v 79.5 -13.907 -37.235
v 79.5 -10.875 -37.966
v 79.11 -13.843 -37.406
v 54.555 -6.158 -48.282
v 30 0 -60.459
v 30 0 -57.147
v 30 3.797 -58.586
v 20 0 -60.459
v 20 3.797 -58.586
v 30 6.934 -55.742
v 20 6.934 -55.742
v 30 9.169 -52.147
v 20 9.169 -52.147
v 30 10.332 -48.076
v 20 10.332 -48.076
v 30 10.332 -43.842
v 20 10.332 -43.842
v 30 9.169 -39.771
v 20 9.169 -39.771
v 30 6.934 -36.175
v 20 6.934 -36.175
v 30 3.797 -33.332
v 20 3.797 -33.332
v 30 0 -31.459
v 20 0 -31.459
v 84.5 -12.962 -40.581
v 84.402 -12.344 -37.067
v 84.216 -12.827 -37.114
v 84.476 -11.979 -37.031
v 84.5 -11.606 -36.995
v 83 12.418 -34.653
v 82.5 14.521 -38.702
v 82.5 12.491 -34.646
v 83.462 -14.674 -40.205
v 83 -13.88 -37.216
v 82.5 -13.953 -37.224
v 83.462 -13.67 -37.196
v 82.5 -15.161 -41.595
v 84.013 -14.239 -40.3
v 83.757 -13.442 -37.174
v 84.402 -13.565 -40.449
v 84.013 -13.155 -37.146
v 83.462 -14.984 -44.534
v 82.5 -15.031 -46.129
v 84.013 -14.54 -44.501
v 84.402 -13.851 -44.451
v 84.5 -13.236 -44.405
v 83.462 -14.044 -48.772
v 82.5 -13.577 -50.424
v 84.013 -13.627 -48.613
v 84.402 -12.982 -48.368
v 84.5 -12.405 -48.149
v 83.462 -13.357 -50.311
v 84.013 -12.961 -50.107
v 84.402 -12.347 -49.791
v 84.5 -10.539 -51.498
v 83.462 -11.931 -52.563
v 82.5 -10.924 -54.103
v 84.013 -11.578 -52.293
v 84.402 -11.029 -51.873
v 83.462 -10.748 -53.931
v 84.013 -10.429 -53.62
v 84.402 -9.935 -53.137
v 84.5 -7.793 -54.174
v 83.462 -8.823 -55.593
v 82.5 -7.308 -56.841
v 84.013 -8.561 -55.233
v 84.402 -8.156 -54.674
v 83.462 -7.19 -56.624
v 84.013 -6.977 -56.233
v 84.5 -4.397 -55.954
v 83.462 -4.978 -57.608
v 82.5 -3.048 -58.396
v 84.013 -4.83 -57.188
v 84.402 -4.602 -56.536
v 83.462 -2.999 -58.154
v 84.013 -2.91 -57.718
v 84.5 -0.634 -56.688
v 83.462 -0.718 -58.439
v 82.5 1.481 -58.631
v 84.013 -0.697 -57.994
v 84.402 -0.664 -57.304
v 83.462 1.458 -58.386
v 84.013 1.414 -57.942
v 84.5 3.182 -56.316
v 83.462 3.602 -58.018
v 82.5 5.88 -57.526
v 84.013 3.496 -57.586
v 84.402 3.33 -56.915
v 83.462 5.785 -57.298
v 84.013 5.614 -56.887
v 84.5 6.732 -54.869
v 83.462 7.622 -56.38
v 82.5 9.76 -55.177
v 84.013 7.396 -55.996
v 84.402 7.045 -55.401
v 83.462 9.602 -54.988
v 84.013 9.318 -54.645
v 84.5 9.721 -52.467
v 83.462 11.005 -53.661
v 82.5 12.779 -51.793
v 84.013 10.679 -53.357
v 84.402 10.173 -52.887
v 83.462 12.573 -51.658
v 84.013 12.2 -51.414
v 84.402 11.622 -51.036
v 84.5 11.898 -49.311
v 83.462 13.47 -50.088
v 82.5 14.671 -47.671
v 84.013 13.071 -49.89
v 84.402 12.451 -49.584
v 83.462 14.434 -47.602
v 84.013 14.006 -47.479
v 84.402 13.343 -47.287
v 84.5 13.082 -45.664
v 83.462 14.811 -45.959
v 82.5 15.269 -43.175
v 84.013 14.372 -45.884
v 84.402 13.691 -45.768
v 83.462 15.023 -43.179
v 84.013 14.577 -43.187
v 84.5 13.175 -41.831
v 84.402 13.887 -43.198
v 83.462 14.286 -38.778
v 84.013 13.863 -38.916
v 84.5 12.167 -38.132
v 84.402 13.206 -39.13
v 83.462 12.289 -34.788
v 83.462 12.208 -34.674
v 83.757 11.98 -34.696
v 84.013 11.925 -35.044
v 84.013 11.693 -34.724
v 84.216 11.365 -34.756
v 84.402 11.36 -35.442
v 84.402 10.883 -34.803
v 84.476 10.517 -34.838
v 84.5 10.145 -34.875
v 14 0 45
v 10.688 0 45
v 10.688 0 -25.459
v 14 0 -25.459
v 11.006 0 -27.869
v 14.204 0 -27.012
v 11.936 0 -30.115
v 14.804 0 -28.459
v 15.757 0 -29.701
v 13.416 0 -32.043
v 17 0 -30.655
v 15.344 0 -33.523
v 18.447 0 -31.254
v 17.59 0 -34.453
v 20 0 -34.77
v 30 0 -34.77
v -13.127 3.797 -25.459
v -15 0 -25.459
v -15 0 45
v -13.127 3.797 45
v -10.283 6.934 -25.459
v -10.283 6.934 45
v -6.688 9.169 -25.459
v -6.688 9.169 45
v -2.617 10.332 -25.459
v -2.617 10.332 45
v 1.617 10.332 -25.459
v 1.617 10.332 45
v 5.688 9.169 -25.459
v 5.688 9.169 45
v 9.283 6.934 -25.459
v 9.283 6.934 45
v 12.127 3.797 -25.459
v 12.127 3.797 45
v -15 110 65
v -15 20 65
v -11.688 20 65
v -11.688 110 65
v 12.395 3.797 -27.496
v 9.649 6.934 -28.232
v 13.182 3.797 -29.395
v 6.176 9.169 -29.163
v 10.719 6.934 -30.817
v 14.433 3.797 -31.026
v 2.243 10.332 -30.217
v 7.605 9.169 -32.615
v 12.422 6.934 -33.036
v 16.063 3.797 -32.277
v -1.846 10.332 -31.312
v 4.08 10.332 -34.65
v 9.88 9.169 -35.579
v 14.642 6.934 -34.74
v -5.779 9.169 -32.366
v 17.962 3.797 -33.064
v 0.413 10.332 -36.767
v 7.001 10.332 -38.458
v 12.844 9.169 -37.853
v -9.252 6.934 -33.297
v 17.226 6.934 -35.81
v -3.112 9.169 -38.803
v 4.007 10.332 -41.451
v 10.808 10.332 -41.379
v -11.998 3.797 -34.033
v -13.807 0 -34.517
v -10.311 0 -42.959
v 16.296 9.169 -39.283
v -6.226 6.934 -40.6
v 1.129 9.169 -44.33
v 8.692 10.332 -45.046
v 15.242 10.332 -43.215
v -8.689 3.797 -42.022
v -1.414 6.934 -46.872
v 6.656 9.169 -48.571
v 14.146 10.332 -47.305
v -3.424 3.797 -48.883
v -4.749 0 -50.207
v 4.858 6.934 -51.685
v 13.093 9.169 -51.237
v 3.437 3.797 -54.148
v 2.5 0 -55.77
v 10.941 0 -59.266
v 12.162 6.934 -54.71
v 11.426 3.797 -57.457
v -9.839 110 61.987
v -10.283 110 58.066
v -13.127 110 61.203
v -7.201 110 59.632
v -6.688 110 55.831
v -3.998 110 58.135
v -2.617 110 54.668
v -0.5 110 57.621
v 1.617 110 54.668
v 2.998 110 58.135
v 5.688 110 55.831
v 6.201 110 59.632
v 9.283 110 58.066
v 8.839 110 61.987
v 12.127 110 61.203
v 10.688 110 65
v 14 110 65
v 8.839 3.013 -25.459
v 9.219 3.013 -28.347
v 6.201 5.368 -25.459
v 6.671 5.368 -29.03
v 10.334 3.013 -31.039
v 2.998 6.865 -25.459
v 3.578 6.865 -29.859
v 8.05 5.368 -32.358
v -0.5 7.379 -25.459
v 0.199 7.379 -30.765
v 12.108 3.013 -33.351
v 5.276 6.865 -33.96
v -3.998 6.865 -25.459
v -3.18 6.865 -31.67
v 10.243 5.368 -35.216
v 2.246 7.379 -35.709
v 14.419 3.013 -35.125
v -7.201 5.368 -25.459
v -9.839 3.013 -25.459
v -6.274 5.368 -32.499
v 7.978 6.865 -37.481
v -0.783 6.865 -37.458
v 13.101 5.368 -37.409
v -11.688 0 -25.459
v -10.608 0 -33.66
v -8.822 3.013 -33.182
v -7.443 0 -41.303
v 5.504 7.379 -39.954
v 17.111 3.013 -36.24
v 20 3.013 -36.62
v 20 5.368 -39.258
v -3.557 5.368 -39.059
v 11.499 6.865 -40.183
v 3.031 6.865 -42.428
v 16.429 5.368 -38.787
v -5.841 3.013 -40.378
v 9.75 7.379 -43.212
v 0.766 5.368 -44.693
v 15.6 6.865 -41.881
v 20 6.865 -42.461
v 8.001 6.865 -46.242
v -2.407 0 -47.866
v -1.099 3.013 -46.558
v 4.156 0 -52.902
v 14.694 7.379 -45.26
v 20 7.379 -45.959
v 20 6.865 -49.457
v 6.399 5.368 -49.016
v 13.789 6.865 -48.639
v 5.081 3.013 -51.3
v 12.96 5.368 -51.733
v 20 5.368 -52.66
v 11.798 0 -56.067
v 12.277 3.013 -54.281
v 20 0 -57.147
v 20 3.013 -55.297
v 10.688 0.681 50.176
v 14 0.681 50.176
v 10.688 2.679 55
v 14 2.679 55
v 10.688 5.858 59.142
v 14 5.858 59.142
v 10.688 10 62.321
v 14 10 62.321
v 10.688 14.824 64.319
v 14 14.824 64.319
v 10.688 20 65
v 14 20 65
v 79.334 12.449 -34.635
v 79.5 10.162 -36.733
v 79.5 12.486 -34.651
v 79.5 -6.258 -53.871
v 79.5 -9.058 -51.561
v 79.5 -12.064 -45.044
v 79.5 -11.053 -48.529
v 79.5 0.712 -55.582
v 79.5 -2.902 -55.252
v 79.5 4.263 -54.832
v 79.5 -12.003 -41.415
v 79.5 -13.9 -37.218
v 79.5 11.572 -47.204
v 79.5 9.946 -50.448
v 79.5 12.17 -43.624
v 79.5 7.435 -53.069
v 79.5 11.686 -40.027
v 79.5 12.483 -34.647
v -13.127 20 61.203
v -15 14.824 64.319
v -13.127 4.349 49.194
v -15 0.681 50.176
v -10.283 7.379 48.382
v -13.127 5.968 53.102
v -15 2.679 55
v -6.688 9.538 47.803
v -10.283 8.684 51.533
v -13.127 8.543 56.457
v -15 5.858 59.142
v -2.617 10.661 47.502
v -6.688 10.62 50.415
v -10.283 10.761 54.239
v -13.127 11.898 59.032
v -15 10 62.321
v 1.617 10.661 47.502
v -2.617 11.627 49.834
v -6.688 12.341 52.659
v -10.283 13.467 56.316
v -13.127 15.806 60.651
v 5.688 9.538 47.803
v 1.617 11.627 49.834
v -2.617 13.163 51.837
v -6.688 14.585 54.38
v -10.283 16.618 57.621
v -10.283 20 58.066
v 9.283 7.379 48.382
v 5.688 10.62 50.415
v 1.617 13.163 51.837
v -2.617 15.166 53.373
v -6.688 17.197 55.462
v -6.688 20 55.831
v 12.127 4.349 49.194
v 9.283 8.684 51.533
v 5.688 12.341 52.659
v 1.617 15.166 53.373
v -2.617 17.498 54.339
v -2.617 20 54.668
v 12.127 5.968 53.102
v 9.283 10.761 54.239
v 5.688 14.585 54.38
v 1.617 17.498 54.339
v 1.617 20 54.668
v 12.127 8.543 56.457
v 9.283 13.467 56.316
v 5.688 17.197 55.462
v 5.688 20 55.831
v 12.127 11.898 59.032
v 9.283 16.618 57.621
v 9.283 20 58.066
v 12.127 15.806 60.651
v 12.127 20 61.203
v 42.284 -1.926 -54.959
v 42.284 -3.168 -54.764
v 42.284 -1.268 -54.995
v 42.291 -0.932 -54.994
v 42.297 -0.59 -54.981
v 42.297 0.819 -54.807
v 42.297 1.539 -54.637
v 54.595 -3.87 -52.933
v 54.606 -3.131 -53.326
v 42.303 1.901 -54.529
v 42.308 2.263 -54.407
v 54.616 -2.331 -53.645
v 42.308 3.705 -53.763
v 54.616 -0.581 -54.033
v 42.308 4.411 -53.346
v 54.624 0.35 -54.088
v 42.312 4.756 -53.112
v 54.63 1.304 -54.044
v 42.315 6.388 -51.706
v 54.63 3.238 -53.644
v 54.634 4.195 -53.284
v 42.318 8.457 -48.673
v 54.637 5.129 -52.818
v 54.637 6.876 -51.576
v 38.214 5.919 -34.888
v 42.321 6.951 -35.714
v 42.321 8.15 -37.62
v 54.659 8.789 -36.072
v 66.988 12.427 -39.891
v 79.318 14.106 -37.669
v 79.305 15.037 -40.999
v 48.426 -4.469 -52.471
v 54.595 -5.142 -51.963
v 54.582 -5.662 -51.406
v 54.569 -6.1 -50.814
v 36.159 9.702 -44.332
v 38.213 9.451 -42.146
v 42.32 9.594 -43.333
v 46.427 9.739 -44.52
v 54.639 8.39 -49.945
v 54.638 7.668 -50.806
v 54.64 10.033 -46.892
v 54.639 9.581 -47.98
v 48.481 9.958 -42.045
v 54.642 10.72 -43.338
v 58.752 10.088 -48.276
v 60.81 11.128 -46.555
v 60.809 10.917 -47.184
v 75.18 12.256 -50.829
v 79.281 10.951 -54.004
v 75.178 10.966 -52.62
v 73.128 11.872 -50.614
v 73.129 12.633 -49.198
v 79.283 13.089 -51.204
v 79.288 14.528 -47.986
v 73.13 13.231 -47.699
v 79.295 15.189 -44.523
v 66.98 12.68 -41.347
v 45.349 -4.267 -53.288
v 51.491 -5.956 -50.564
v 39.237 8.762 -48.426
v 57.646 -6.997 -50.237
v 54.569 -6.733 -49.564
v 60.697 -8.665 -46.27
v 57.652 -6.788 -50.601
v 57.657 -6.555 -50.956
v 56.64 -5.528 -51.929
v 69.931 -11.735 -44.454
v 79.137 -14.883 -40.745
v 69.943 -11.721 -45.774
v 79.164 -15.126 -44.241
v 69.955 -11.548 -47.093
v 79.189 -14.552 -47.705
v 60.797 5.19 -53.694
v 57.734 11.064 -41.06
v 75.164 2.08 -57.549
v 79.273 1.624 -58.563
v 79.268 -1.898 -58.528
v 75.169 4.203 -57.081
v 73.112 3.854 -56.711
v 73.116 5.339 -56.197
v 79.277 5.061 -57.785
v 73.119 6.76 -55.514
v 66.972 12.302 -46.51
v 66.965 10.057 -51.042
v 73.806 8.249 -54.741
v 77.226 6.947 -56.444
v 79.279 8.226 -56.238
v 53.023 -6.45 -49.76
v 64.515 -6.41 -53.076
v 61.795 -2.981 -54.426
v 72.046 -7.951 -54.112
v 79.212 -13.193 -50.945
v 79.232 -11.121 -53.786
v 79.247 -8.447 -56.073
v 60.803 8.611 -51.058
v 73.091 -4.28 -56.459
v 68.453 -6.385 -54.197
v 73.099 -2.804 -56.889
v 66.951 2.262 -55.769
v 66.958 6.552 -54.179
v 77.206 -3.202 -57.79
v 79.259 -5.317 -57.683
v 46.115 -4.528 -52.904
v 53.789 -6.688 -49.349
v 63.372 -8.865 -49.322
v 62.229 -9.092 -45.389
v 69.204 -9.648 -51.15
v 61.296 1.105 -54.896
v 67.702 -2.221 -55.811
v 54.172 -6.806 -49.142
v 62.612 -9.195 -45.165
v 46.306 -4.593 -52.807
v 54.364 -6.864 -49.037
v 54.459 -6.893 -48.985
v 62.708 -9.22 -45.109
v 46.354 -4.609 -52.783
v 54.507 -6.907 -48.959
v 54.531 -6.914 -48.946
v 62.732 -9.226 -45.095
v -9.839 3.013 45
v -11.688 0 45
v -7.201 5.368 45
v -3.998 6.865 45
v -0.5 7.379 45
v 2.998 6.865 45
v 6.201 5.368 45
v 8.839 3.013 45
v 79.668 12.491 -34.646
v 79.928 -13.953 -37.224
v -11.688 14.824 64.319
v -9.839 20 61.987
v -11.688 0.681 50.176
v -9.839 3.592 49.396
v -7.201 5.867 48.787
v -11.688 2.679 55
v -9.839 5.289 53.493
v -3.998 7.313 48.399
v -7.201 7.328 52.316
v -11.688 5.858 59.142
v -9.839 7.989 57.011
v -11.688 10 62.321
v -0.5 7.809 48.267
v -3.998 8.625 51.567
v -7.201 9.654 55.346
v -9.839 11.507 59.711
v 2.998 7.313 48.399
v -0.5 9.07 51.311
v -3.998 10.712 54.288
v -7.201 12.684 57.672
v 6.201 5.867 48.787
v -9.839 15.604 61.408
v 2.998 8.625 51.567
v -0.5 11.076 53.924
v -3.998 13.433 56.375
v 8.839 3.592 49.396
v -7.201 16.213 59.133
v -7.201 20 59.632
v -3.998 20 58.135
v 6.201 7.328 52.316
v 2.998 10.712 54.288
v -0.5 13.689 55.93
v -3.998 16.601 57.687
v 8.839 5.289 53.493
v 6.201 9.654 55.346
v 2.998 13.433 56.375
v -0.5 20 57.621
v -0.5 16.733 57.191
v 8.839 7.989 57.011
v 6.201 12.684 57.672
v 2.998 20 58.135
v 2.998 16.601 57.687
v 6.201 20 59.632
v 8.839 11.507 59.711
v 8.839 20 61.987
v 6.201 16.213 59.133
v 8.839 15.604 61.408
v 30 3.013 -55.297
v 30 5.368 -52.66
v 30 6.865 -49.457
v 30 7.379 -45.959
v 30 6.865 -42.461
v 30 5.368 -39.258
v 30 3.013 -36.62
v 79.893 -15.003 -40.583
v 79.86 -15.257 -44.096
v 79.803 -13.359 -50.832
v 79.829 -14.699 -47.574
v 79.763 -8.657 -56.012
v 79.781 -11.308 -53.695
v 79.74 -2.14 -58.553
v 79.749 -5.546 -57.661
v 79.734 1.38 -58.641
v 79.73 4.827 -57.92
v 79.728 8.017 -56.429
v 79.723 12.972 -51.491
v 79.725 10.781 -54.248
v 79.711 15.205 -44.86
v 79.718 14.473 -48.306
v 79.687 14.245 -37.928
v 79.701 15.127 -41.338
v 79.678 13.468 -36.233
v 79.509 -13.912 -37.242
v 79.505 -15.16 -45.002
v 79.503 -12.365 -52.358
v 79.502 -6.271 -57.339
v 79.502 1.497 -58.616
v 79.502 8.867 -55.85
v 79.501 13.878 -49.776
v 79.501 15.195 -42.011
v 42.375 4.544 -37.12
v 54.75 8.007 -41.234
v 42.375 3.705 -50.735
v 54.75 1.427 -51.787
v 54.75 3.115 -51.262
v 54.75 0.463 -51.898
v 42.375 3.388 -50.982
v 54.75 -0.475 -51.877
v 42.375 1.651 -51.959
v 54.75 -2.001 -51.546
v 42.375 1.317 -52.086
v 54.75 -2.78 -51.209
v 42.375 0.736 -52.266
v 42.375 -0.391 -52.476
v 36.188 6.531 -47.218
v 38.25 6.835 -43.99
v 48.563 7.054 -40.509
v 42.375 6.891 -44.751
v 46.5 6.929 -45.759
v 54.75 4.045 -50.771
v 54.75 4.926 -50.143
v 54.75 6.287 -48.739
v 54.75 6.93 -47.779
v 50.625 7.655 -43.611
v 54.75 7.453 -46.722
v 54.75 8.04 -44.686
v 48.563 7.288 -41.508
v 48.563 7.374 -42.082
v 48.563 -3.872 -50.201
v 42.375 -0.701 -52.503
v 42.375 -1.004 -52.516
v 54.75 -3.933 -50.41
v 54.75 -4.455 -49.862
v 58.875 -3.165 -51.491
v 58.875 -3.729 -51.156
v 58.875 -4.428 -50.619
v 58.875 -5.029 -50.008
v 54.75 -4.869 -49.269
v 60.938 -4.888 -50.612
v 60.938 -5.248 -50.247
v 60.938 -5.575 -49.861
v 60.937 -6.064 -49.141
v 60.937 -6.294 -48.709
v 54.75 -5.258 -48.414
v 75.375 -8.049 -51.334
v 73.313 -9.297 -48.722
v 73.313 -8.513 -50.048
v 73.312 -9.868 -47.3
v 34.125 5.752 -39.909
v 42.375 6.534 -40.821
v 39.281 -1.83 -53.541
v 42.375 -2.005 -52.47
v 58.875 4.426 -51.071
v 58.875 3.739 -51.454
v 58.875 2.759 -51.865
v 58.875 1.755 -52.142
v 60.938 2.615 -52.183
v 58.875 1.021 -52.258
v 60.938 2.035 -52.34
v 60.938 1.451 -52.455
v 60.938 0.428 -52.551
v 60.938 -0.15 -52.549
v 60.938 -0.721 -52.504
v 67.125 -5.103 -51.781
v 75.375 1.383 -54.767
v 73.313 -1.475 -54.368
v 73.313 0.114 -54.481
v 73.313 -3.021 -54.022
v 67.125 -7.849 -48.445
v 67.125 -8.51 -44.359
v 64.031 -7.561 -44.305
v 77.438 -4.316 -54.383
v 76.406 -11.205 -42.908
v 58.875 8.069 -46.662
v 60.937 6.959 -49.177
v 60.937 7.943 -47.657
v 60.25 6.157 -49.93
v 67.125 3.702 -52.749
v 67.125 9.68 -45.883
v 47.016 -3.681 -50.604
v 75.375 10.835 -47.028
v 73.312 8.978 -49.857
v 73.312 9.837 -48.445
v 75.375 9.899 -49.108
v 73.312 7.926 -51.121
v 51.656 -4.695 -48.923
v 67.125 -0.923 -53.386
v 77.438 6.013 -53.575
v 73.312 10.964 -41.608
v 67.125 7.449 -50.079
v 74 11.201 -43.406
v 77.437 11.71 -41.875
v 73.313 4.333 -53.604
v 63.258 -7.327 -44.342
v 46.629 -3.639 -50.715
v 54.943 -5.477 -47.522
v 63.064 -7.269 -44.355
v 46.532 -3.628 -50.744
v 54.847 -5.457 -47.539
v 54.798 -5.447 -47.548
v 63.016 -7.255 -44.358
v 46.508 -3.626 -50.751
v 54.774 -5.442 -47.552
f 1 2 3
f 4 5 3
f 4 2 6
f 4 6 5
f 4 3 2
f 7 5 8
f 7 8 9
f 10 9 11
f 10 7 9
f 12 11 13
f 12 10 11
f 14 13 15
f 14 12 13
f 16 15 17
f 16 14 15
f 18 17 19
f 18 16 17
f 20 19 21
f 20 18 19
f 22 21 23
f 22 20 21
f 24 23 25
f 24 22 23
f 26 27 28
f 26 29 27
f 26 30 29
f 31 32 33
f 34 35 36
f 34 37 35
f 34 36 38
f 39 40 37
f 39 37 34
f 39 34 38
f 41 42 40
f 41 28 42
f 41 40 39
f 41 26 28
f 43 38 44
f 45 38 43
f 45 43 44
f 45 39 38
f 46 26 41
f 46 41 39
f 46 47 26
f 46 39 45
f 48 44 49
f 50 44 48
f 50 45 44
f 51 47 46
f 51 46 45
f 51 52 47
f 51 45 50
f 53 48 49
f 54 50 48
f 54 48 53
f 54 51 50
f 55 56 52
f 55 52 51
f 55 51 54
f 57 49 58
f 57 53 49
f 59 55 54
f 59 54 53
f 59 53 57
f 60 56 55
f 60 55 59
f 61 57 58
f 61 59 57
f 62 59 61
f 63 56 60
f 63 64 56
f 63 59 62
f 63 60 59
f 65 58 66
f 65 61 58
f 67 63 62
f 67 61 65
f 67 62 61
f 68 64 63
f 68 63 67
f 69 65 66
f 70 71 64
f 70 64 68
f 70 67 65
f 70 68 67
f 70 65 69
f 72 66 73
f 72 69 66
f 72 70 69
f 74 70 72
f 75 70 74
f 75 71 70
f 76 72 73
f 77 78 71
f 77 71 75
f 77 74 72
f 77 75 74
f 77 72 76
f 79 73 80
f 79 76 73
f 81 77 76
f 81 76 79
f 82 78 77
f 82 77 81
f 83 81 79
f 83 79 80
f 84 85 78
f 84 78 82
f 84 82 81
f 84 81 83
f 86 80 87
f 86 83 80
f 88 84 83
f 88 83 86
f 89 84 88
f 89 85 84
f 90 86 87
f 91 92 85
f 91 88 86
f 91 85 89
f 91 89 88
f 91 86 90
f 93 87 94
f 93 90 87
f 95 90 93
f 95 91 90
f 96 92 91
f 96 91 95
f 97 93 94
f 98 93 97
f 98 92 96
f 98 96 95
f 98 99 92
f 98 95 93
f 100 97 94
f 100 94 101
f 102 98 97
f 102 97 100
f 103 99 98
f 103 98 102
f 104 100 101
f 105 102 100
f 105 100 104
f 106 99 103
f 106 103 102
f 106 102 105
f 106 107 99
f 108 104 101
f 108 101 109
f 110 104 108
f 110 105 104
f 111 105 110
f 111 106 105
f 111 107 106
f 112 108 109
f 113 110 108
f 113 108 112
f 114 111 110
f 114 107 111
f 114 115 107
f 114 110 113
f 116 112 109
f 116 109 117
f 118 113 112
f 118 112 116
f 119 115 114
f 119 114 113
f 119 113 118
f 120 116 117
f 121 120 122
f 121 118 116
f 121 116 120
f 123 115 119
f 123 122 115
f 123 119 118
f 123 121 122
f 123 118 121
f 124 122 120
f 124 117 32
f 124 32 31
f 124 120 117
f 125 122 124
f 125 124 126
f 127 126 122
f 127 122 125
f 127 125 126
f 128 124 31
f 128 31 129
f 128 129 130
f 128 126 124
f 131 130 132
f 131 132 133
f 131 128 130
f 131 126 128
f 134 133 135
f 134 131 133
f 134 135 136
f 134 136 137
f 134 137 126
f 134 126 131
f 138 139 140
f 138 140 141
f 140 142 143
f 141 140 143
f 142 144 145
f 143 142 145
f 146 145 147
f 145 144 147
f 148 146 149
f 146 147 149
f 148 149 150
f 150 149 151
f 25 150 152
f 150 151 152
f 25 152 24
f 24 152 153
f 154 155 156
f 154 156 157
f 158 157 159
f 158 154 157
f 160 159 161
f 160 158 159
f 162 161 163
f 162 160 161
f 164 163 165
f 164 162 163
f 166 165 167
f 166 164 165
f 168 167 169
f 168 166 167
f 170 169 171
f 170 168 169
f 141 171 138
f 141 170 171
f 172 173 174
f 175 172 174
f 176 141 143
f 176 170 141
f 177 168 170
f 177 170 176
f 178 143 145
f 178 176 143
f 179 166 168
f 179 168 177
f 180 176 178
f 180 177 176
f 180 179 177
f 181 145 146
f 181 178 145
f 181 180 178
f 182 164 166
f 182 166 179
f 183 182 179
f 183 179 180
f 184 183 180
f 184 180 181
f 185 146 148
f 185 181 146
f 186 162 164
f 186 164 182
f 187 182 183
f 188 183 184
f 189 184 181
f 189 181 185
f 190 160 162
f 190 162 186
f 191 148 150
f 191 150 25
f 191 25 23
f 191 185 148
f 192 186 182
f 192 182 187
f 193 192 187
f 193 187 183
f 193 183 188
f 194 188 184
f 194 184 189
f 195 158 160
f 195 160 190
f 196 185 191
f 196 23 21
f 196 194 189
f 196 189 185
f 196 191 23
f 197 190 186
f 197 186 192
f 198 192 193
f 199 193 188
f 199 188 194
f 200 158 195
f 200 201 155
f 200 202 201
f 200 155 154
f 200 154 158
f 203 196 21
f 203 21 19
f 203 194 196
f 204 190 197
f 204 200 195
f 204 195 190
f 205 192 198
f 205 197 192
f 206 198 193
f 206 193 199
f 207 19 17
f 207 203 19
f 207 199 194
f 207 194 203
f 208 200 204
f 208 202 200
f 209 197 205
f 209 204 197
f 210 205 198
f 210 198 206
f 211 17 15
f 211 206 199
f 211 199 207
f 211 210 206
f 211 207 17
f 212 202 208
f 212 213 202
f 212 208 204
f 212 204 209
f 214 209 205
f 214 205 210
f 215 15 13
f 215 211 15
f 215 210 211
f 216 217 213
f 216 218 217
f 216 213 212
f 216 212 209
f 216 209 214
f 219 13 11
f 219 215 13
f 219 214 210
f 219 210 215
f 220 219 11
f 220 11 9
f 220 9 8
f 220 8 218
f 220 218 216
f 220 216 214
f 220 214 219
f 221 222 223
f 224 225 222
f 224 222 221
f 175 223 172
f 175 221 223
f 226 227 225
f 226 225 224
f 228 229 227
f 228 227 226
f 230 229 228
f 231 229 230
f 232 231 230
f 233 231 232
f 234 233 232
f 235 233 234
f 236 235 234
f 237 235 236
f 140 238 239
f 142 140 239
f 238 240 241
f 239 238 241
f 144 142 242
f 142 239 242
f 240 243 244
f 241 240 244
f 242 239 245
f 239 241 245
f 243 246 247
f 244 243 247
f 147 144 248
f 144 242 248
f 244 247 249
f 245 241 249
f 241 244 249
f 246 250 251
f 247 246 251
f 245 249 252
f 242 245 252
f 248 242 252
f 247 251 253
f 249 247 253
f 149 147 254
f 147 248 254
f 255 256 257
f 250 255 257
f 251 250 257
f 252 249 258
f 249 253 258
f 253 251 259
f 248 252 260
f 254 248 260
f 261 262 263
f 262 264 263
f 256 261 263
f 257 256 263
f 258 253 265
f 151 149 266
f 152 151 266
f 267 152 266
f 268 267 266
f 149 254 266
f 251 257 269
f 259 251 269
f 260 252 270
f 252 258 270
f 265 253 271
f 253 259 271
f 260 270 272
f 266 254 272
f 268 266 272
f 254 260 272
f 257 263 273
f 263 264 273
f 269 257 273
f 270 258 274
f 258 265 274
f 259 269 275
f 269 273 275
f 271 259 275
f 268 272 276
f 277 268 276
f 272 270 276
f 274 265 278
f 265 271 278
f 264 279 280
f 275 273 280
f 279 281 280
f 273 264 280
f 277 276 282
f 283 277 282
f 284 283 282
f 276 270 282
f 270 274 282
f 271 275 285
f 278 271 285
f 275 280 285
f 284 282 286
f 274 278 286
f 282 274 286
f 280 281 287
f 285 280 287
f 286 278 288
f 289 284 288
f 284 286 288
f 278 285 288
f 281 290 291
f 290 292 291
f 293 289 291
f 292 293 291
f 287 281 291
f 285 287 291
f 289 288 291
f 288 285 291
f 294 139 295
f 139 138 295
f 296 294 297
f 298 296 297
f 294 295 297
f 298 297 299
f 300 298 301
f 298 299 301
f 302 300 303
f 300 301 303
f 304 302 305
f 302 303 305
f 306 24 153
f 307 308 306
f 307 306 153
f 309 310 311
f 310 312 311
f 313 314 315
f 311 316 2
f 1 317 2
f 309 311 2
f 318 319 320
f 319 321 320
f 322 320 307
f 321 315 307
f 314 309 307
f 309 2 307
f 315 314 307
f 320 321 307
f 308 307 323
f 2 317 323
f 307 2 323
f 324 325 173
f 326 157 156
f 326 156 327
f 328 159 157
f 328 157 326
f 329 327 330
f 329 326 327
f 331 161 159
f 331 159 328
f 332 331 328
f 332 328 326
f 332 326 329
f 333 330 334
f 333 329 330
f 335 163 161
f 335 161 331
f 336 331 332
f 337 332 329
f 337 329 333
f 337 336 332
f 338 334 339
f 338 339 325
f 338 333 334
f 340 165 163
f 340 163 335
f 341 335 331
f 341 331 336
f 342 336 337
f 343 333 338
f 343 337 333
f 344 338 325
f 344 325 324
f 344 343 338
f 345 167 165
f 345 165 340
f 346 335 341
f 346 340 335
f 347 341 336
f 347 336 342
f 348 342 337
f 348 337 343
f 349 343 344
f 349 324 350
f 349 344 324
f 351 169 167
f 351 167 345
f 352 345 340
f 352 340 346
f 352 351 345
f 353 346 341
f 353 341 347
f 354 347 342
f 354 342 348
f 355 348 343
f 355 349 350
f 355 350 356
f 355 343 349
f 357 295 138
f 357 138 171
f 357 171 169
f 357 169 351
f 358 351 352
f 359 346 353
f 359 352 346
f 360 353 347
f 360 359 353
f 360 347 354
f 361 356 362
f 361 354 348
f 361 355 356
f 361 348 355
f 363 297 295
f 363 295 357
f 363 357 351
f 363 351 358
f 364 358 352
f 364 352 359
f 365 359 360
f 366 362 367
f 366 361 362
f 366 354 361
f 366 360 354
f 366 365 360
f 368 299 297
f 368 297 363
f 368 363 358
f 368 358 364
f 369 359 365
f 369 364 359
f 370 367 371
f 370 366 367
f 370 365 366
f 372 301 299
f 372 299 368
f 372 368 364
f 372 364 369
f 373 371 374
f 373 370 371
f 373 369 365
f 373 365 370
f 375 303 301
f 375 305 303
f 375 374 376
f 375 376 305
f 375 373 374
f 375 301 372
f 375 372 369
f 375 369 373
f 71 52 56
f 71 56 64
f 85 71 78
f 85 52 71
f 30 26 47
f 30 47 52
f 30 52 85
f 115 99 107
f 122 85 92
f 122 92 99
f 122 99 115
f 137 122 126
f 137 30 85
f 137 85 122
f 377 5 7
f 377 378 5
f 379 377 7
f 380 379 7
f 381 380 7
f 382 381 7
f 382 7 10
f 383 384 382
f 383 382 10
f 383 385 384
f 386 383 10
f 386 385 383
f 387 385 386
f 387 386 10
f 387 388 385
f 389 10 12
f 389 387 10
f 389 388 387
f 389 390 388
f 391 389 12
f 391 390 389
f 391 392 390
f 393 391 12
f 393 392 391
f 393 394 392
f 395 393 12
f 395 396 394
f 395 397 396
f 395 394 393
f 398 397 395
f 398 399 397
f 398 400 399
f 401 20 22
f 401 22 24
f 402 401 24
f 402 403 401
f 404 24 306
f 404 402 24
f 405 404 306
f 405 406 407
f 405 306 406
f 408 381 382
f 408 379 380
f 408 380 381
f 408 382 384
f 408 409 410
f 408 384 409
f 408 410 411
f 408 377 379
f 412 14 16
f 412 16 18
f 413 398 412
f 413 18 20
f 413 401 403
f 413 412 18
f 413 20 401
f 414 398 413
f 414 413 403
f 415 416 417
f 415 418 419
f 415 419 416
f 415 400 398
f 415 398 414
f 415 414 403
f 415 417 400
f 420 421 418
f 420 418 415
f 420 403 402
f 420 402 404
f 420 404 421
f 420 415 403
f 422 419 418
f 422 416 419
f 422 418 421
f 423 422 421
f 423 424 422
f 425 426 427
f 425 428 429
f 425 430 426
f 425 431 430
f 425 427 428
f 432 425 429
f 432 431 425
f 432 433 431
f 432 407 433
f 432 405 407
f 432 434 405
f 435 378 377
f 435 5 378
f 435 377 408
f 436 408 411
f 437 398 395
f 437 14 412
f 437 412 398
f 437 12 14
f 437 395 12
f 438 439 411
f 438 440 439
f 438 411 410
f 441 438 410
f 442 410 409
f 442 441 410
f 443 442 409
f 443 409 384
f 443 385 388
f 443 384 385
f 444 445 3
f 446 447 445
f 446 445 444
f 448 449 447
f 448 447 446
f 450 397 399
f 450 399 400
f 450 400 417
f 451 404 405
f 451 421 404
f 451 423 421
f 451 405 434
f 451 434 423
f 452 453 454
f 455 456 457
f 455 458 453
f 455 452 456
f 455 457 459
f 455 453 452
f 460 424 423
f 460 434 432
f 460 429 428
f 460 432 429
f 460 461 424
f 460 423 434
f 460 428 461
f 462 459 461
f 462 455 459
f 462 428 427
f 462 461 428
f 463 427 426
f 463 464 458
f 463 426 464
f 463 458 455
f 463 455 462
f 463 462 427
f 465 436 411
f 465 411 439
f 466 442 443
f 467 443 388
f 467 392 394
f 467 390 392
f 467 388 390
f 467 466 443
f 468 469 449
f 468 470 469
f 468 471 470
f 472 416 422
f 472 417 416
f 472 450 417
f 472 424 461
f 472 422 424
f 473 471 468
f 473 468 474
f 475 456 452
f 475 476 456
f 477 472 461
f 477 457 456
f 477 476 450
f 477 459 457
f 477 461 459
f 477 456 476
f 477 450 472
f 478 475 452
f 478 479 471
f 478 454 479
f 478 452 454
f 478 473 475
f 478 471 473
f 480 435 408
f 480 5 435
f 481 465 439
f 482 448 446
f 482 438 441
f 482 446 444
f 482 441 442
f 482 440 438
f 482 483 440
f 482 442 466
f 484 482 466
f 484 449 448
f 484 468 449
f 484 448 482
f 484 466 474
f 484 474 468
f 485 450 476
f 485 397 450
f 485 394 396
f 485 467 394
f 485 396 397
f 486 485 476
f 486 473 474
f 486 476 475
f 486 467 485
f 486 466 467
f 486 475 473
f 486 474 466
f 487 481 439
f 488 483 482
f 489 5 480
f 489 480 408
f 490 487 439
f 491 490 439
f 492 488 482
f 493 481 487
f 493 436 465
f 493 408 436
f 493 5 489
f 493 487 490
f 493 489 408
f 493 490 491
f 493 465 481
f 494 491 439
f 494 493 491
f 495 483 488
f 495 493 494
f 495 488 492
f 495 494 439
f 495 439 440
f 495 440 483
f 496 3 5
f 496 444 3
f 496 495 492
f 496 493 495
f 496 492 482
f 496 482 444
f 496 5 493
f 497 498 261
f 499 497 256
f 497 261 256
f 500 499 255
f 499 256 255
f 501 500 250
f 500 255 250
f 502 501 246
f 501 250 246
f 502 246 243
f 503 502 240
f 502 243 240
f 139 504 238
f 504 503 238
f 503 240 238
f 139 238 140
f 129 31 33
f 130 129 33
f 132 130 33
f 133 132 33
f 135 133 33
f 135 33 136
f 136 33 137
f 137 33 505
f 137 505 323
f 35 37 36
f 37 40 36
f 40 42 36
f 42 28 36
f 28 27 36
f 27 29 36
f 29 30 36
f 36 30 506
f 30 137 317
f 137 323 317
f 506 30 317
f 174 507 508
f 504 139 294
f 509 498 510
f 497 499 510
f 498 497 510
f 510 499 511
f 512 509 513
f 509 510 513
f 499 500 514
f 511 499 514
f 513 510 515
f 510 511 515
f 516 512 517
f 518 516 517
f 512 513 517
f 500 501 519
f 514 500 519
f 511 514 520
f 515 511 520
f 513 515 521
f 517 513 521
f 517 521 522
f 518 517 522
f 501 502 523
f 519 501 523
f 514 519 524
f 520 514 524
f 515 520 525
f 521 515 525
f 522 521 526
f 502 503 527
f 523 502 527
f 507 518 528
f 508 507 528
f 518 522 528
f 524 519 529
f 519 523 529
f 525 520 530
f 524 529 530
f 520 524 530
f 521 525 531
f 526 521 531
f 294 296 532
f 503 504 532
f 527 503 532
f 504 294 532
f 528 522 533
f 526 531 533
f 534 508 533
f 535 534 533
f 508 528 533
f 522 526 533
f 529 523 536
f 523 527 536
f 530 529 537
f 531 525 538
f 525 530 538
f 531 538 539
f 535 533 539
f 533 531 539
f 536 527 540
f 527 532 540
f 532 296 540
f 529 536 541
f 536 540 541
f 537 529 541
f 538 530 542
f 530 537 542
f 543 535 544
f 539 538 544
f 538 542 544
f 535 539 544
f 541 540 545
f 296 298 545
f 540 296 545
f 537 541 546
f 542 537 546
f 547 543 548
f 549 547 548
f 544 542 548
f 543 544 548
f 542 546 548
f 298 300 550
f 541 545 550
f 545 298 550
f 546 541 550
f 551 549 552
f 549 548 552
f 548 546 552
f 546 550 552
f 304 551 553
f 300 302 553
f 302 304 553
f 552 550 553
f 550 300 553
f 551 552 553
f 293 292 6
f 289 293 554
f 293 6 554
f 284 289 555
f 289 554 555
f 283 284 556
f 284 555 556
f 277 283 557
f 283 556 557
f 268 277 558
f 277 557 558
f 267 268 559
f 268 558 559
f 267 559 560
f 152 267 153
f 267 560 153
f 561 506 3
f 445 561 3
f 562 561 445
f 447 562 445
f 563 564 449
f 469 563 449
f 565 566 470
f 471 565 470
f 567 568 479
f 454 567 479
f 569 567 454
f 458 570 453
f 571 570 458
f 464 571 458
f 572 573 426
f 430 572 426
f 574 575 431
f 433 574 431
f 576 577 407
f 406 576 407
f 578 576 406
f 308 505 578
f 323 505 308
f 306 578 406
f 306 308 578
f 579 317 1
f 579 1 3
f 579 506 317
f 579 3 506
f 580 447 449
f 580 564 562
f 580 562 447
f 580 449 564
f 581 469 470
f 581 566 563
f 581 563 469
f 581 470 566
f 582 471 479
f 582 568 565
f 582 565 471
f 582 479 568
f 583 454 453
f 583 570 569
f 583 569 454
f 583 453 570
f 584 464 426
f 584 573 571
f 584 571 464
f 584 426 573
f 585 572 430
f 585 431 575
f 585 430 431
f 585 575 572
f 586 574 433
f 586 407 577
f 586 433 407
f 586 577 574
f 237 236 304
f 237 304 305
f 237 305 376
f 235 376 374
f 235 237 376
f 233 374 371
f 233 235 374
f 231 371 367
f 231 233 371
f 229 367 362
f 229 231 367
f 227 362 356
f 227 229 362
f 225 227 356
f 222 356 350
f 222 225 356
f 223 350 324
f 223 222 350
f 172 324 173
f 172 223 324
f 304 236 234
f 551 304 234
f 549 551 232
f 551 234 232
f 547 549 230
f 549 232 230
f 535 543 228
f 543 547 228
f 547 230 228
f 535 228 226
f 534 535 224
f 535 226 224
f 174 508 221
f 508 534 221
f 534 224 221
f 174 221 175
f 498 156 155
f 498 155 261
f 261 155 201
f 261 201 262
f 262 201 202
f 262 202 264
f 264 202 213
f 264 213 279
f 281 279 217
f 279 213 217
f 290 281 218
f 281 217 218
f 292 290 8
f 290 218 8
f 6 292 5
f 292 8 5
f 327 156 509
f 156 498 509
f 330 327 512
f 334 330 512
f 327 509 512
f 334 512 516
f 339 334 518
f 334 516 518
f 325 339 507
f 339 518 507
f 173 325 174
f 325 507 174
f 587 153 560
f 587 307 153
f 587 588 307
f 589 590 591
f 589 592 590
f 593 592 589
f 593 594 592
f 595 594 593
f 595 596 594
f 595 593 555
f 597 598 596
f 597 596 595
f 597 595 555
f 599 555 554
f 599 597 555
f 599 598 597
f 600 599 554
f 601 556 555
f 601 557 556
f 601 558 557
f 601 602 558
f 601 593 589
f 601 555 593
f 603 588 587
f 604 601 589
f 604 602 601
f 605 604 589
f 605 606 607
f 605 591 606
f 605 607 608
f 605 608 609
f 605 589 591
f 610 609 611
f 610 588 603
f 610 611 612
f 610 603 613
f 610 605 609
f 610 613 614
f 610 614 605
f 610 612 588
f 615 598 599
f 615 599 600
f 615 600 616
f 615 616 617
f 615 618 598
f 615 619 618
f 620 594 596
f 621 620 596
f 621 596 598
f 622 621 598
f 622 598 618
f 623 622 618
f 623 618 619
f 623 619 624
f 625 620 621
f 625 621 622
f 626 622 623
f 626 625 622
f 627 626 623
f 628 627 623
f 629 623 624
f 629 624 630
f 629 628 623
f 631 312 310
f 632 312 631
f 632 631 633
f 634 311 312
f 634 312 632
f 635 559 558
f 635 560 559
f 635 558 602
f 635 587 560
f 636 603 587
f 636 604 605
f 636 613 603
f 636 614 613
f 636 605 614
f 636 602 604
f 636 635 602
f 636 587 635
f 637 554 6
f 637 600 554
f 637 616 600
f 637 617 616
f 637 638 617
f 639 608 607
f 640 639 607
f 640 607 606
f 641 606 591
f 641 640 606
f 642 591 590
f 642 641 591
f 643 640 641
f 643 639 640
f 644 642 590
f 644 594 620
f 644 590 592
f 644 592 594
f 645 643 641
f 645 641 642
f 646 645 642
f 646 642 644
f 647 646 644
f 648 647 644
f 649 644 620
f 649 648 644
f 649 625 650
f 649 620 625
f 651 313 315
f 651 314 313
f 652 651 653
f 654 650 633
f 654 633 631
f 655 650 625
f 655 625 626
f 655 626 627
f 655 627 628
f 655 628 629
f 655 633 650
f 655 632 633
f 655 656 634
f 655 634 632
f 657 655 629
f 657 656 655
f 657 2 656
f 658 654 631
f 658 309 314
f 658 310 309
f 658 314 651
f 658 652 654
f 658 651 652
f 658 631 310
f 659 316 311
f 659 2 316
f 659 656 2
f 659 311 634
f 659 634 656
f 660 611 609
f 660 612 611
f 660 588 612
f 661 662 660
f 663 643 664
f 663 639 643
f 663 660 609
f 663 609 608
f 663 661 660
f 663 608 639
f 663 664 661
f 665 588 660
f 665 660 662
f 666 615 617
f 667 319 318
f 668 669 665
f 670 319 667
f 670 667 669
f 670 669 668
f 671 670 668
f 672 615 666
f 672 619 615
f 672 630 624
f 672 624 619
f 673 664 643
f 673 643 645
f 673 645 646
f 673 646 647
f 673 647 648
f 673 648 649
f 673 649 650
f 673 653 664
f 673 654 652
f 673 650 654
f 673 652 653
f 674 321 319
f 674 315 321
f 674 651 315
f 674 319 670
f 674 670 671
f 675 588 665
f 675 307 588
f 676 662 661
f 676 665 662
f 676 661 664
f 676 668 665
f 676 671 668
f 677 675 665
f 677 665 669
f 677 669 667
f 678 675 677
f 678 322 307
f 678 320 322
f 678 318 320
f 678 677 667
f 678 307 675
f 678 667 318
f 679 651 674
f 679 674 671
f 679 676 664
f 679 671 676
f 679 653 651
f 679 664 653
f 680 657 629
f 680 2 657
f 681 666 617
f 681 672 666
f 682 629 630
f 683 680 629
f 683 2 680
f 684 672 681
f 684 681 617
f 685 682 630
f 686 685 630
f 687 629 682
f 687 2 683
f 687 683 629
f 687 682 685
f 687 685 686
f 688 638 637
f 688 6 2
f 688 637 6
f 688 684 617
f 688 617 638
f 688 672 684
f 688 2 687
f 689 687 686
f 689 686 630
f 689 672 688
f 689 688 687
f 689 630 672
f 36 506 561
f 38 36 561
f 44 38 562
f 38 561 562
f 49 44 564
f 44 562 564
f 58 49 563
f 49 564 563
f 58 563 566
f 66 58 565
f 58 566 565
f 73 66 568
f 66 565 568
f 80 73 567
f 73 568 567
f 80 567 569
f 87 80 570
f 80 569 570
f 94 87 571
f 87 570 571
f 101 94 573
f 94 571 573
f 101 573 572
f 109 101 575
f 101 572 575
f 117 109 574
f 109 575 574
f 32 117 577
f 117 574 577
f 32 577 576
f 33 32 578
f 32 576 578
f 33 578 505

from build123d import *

# Parameters (mm, degrees)
F9_DEPTH = 5
F10_R    = 2


with BuildPart() as f2:
    # F2: sweep along a path in F1
    with BuildLine(Plane.YZ) as f2_path:
        Line((0, 0), (0, 45))
        ThreePointArc((0, 45), (5.8578643763, 59.1421356237), (20, 65))
        Line((20, 65), (110, 65))
    # F0 (on Top) → F2 (sweep)
    with BuildSketch(Plane.XY):
        with BuildLine():
            ThreePointArc((14, 0), (-0.5, 10.478936224), (-15, 0))
            Line((-15, 0), (-11.6882403352, 0))
            ThreePointArc((-11.6882403352, 0), (-0.5, 7.3789365762), (10.6882403352, 0))
            Line((10.6882403352, 0), (14, 0))
        make_face()
    sweep(path=f2_path.line)

    # F6: sweep along a path in F4
    with BuildLine(Plane.XZ) as f6_path:
        Line((0, 0), (0, -25.4587277886))
        ThreePointArc((0, -25.4587277886), (5.8578643763, -39.6008634124), (20, -45.4587277886))
        Line((20, -45.4587277886), (30, -45.4587277886))
    # F0 (on Top) → F6 (sweep)
    with BuildSketch(Plane.XY):
        with BuildLine():
            ThreePointArc((14, 0), (-0.5, 10.478936224), (-15, 0))
            Line((-15, 0), (-11.6882403352, 0))
            ThreePointArc((-11.6882403352, 0), (-0.5, 7.3789365762), (10.6882403352, 0))
            Line((10.6882403352, 0), (14, 0))
        make_face()
    sweep(path=f6_path.line)

    # F6_face (on face) → F7 section 0
    with BuildSketch(Plane(origin=(30, 5.8470332672, -45.9587277886), x_dir=(0, 1, 0), z_dir=(1, 0, 0))):
        with BuildLine():
            Line((-5.8470332672, -11.1882403352), (-5.8470332672, -14.5))
            ThreePointArc((-5.8470332672, -14.5), (4.6319029568, 0), (-5.8470332672, 14.5))
            Line((-5.8470332672, 14.5), (-5.8470332672, 11.1882403352))
            ThreePointArc((-5.8470332672, 11.1882403352), (1.5319033089, 0), (-5.8470332672, -11.1882403352))
        make_face()
    # F5 (on offset) → F7 section 1
    with BuildSketch(Plane.YZ.offset(79.5)):
        with BuildLine():
            Line((-10.8751536487, -37.9657093932), (-13.9526978979, -37.2235111379))
            ThreePointArc((-13.9526978979, -37.2235111379), (1.4814826902, -58.6311098034), (12.4912671201, -34.6460340717))
            Line((12.4912671201, -34.6460340717), (10.1624930815, -36.7332008739))
            ThreePointArc((10.1624930815, -36.7332008739), (0.7118567894, -55.5823045887), (-10.8751536487, -37.9657093932))
        make_face()
    loft()

    # F5 (on offset) + F8 (on face) → F9 (join)
    with BuildSketch(Plane.YZ.offset(79.5)):
        with BuildLine():
            Line((-10.8751536487, -37.9657093932), (-13.9526978979, -37.2235111379))
            ThreePointArc((-13.9526978979, -37.2235111379), (1.4814826902, -58.6311098034), (12.4912671201, -34.6460340717))
            Line((12.4912671201, -34.6460340717), (10.1624930815, -36.7332008739))
            ThreePointArc((10.1624930815, -36.7332008739), (0.7118567894, -55.5823045887), (-10.8751536487, -37.9657093932))
        make_face()
    with BuildSketch(Plane.YZ.offset(79.5)):
        with BuildLine():
            Line((12.4912671201, -34.6460340717), (10.1624930815, -36.7332008739))
            ThreePointArc((10.1624930815, -36.7332008739), (0.7118567894, -55.5823045887), (-10.8751536487, -37.9657093932))
            Line((-10.8751536487, -37.9657093932), (-13.9526978979, -37.2235111379))
            ThreePointArc((-13.9526978979, -37.2235111379), (1.4814826902, -58.6311098034), (12.4912671201, -34.6460340717))
        make_face()
        with BuildLine():
            ThreePointArc((-10.8751536487, -37.9657093932), (0.7118567894, -55.5823045887), (10.1624930815, -36.7332008739))
            Line((10.1624930815, -36.7332008739), (12.4912671201, -34.6460340717))
            Line((12.4912671201, -34.6460340717), (-13.9526978979, -37.2235111379))
            Line((-13.9526978979, -37.2235111379), (-10.8751536487, -37.9657093932))
        make_face()
    extrude(amount=F9_DEPTH)

    # F10
    f10_edges = [f2.edges().sort_by_distance(p)[0] for p in [
        (84.5, 1.481483, -58.63111),
        (79.5, 1.481483, -58.63111),
    ]]
    fillet(f10_edges, radius=F10_R)


solid = f2.part
